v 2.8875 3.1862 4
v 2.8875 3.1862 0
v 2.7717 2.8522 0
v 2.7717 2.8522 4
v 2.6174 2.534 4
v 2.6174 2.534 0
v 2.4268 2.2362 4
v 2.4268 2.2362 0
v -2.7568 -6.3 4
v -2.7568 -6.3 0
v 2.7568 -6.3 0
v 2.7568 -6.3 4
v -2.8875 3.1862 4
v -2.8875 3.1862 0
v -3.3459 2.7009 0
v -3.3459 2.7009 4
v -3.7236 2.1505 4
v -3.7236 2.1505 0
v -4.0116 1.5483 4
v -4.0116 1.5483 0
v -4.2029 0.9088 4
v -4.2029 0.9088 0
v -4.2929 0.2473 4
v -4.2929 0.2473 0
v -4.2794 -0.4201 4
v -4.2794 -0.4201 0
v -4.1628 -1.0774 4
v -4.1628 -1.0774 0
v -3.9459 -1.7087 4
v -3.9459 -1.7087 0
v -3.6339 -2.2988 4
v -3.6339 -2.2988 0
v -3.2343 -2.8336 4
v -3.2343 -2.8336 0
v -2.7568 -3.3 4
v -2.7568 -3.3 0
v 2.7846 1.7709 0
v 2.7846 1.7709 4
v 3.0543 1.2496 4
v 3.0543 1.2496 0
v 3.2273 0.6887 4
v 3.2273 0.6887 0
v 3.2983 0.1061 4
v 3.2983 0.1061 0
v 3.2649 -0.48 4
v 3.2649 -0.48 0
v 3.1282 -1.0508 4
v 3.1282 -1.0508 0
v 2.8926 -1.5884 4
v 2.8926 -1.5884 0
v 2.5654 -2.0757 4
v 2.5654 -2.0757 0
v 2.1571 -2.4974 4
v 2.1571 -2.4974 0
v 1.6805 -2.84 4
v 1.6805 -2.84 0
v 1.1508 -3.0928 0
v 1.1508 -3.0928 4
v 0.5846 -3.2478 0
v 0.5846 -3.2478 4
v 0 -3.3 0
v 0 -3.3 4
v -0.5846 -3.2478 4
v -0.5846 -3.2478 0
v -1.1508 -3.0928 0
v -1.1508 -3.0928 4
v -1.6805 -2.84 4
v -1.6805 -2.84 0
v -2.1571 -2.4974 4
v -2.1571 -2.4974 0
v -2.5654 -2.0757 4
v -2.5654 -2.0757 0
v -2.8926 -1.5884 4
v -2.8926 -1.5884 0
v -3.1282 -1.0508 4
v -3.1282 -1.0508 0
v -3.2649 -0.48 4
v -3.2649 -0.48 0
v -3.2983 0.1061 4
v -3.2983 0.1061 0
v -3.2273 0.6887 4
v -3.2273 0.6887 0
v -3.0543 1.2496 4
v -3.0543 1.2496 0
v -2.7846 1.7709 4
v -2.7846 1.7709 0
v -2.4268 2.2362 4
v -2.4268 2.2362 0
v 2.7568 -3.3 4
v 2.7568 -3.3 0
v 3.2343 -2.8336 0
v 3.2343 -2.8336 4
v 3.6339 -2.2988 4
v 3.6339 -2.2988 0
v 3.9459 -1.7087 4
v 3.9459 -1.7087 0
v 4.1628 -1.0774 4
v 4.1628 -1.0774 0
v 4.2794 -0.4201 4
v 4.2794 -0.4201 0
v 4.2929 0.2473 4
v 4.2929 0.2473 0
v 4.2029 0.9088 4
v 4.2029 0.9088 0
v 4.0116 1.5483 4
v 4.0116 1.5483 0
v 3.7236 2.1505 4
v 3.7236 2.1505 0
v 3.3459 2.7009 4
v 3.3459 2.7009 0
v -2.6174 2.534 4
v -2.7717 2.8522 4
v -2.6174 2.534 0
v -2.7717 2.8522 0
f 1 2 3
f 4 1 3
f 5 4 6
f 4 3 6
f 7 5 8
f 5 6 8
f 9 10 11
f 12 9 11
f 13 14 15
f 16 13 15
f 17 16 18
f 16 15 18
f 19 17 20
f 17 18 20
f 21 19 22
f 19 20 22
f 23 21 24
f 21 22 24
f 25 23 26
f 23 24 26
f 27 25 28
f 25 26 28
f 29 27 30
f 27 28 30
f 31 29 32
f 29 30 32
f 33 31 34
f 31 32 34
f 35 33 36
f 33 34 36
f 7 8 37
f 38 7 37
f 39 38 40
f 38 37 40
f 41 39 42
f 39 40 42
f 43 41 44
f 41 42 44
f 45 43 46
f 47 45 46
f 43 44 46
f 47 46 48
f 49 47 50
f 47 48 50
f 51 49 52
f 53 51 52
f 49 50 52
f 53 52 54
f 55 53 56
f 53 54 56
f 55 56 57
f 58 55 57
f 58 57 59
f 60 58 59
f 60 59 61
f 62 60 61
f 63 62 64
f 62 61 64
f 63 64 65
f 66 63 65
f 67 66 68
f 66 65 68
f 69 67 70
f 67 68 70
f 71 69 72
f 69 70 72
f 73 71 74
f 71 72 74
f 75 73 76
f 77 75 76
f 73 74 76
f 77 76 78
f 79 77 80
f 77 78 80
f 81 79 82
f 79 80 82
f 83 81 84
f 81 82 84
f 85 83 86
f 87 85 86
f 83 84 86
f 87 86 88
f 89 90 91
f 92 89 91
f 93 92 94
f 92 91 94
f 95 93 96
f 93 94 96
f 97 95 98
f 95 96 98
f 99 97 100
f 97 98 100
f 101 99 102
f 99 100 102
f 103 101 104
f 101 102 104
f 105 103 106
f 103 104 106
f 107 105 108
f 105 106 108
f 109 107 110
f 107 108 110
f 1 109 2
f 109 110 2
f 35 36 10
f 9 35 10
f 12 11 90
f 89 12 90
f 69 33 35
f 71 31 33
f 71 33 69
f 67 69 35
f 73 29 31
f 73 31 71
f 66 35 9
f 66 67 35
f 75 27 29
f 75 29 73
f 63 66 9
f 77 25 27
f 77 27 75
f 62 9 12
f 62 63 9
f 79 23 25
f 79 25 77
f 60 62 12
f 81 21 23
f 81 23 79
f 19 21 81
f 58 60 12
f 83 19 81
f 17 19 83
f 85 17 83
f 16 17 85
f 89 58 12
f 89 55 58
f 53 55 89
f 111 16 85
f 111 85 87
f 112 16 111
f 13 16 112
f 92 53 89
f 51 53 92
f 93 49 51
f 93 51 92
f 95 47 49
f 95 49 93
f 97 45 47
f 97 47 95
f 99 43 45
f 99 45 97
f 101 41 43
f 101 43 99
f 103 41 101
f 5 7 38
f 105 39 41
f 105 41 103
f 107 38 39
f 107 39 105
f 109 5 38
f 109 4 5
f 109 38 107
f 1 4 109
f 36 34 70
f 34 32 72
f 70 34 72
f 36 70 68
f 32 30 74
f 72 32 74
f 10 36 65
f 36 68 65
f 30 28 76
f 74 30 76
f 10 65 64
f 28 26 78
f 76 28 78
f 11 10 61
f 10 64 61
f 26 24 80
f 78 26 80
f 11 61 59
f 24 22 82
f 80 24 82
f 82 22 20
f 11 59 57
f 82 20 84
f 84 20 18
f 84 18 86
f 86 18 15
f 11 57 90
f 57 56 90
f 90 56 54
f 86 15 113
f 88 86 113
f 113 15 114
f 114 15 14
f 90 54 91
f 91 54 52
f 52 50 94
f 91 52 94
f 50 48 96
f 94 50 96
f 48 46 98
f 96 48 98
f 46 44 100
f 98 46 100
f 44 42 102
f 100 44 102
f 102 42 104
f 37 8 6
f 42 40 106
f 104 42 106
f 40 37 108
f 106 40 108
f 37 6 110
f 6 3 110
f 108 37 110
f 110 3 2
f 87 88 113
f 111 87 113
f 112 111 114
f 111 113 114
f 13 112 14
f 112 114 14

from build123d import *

# Parameters (mm, degrees)
F1_DEPTH = 4


with BuildPart() as f1:
    # F0 (on Top) → F1 (new body)
    with BuildSketch(Plane.XY):
        with BuildLine():
            ThreePointArc((2.426764, 2.23625), (0, -3.3), (-2.426764, 2.23625))
            ThreePointArc((-2.426764, 2.23625), (-2.699268, 2.69082), (-2.887527, 3.18625))
            ThreePointArc((-2.887527, 3.18625), (-4.299127, -0.08664), (-2.75681, -3.3))
            Line((-2.75681, -3.3), (-2.75681, -6.3))
            Line((-2.75681, -6.3), (2.75681, -6.3))
            Line((2.75681, -6.3), (2.75681, -3.3))
            ThreePointArc((2.75681, -3.3), (4.299127, -0.08664), (2.887527, 3.18625))
            ThreePointArc((2.887527, 3.18625), (2.699268, 2.69082), (2.426764, 2.23625))
        make_face()
    extrude(amount=F1_DEPTH)


solid = f1.part
